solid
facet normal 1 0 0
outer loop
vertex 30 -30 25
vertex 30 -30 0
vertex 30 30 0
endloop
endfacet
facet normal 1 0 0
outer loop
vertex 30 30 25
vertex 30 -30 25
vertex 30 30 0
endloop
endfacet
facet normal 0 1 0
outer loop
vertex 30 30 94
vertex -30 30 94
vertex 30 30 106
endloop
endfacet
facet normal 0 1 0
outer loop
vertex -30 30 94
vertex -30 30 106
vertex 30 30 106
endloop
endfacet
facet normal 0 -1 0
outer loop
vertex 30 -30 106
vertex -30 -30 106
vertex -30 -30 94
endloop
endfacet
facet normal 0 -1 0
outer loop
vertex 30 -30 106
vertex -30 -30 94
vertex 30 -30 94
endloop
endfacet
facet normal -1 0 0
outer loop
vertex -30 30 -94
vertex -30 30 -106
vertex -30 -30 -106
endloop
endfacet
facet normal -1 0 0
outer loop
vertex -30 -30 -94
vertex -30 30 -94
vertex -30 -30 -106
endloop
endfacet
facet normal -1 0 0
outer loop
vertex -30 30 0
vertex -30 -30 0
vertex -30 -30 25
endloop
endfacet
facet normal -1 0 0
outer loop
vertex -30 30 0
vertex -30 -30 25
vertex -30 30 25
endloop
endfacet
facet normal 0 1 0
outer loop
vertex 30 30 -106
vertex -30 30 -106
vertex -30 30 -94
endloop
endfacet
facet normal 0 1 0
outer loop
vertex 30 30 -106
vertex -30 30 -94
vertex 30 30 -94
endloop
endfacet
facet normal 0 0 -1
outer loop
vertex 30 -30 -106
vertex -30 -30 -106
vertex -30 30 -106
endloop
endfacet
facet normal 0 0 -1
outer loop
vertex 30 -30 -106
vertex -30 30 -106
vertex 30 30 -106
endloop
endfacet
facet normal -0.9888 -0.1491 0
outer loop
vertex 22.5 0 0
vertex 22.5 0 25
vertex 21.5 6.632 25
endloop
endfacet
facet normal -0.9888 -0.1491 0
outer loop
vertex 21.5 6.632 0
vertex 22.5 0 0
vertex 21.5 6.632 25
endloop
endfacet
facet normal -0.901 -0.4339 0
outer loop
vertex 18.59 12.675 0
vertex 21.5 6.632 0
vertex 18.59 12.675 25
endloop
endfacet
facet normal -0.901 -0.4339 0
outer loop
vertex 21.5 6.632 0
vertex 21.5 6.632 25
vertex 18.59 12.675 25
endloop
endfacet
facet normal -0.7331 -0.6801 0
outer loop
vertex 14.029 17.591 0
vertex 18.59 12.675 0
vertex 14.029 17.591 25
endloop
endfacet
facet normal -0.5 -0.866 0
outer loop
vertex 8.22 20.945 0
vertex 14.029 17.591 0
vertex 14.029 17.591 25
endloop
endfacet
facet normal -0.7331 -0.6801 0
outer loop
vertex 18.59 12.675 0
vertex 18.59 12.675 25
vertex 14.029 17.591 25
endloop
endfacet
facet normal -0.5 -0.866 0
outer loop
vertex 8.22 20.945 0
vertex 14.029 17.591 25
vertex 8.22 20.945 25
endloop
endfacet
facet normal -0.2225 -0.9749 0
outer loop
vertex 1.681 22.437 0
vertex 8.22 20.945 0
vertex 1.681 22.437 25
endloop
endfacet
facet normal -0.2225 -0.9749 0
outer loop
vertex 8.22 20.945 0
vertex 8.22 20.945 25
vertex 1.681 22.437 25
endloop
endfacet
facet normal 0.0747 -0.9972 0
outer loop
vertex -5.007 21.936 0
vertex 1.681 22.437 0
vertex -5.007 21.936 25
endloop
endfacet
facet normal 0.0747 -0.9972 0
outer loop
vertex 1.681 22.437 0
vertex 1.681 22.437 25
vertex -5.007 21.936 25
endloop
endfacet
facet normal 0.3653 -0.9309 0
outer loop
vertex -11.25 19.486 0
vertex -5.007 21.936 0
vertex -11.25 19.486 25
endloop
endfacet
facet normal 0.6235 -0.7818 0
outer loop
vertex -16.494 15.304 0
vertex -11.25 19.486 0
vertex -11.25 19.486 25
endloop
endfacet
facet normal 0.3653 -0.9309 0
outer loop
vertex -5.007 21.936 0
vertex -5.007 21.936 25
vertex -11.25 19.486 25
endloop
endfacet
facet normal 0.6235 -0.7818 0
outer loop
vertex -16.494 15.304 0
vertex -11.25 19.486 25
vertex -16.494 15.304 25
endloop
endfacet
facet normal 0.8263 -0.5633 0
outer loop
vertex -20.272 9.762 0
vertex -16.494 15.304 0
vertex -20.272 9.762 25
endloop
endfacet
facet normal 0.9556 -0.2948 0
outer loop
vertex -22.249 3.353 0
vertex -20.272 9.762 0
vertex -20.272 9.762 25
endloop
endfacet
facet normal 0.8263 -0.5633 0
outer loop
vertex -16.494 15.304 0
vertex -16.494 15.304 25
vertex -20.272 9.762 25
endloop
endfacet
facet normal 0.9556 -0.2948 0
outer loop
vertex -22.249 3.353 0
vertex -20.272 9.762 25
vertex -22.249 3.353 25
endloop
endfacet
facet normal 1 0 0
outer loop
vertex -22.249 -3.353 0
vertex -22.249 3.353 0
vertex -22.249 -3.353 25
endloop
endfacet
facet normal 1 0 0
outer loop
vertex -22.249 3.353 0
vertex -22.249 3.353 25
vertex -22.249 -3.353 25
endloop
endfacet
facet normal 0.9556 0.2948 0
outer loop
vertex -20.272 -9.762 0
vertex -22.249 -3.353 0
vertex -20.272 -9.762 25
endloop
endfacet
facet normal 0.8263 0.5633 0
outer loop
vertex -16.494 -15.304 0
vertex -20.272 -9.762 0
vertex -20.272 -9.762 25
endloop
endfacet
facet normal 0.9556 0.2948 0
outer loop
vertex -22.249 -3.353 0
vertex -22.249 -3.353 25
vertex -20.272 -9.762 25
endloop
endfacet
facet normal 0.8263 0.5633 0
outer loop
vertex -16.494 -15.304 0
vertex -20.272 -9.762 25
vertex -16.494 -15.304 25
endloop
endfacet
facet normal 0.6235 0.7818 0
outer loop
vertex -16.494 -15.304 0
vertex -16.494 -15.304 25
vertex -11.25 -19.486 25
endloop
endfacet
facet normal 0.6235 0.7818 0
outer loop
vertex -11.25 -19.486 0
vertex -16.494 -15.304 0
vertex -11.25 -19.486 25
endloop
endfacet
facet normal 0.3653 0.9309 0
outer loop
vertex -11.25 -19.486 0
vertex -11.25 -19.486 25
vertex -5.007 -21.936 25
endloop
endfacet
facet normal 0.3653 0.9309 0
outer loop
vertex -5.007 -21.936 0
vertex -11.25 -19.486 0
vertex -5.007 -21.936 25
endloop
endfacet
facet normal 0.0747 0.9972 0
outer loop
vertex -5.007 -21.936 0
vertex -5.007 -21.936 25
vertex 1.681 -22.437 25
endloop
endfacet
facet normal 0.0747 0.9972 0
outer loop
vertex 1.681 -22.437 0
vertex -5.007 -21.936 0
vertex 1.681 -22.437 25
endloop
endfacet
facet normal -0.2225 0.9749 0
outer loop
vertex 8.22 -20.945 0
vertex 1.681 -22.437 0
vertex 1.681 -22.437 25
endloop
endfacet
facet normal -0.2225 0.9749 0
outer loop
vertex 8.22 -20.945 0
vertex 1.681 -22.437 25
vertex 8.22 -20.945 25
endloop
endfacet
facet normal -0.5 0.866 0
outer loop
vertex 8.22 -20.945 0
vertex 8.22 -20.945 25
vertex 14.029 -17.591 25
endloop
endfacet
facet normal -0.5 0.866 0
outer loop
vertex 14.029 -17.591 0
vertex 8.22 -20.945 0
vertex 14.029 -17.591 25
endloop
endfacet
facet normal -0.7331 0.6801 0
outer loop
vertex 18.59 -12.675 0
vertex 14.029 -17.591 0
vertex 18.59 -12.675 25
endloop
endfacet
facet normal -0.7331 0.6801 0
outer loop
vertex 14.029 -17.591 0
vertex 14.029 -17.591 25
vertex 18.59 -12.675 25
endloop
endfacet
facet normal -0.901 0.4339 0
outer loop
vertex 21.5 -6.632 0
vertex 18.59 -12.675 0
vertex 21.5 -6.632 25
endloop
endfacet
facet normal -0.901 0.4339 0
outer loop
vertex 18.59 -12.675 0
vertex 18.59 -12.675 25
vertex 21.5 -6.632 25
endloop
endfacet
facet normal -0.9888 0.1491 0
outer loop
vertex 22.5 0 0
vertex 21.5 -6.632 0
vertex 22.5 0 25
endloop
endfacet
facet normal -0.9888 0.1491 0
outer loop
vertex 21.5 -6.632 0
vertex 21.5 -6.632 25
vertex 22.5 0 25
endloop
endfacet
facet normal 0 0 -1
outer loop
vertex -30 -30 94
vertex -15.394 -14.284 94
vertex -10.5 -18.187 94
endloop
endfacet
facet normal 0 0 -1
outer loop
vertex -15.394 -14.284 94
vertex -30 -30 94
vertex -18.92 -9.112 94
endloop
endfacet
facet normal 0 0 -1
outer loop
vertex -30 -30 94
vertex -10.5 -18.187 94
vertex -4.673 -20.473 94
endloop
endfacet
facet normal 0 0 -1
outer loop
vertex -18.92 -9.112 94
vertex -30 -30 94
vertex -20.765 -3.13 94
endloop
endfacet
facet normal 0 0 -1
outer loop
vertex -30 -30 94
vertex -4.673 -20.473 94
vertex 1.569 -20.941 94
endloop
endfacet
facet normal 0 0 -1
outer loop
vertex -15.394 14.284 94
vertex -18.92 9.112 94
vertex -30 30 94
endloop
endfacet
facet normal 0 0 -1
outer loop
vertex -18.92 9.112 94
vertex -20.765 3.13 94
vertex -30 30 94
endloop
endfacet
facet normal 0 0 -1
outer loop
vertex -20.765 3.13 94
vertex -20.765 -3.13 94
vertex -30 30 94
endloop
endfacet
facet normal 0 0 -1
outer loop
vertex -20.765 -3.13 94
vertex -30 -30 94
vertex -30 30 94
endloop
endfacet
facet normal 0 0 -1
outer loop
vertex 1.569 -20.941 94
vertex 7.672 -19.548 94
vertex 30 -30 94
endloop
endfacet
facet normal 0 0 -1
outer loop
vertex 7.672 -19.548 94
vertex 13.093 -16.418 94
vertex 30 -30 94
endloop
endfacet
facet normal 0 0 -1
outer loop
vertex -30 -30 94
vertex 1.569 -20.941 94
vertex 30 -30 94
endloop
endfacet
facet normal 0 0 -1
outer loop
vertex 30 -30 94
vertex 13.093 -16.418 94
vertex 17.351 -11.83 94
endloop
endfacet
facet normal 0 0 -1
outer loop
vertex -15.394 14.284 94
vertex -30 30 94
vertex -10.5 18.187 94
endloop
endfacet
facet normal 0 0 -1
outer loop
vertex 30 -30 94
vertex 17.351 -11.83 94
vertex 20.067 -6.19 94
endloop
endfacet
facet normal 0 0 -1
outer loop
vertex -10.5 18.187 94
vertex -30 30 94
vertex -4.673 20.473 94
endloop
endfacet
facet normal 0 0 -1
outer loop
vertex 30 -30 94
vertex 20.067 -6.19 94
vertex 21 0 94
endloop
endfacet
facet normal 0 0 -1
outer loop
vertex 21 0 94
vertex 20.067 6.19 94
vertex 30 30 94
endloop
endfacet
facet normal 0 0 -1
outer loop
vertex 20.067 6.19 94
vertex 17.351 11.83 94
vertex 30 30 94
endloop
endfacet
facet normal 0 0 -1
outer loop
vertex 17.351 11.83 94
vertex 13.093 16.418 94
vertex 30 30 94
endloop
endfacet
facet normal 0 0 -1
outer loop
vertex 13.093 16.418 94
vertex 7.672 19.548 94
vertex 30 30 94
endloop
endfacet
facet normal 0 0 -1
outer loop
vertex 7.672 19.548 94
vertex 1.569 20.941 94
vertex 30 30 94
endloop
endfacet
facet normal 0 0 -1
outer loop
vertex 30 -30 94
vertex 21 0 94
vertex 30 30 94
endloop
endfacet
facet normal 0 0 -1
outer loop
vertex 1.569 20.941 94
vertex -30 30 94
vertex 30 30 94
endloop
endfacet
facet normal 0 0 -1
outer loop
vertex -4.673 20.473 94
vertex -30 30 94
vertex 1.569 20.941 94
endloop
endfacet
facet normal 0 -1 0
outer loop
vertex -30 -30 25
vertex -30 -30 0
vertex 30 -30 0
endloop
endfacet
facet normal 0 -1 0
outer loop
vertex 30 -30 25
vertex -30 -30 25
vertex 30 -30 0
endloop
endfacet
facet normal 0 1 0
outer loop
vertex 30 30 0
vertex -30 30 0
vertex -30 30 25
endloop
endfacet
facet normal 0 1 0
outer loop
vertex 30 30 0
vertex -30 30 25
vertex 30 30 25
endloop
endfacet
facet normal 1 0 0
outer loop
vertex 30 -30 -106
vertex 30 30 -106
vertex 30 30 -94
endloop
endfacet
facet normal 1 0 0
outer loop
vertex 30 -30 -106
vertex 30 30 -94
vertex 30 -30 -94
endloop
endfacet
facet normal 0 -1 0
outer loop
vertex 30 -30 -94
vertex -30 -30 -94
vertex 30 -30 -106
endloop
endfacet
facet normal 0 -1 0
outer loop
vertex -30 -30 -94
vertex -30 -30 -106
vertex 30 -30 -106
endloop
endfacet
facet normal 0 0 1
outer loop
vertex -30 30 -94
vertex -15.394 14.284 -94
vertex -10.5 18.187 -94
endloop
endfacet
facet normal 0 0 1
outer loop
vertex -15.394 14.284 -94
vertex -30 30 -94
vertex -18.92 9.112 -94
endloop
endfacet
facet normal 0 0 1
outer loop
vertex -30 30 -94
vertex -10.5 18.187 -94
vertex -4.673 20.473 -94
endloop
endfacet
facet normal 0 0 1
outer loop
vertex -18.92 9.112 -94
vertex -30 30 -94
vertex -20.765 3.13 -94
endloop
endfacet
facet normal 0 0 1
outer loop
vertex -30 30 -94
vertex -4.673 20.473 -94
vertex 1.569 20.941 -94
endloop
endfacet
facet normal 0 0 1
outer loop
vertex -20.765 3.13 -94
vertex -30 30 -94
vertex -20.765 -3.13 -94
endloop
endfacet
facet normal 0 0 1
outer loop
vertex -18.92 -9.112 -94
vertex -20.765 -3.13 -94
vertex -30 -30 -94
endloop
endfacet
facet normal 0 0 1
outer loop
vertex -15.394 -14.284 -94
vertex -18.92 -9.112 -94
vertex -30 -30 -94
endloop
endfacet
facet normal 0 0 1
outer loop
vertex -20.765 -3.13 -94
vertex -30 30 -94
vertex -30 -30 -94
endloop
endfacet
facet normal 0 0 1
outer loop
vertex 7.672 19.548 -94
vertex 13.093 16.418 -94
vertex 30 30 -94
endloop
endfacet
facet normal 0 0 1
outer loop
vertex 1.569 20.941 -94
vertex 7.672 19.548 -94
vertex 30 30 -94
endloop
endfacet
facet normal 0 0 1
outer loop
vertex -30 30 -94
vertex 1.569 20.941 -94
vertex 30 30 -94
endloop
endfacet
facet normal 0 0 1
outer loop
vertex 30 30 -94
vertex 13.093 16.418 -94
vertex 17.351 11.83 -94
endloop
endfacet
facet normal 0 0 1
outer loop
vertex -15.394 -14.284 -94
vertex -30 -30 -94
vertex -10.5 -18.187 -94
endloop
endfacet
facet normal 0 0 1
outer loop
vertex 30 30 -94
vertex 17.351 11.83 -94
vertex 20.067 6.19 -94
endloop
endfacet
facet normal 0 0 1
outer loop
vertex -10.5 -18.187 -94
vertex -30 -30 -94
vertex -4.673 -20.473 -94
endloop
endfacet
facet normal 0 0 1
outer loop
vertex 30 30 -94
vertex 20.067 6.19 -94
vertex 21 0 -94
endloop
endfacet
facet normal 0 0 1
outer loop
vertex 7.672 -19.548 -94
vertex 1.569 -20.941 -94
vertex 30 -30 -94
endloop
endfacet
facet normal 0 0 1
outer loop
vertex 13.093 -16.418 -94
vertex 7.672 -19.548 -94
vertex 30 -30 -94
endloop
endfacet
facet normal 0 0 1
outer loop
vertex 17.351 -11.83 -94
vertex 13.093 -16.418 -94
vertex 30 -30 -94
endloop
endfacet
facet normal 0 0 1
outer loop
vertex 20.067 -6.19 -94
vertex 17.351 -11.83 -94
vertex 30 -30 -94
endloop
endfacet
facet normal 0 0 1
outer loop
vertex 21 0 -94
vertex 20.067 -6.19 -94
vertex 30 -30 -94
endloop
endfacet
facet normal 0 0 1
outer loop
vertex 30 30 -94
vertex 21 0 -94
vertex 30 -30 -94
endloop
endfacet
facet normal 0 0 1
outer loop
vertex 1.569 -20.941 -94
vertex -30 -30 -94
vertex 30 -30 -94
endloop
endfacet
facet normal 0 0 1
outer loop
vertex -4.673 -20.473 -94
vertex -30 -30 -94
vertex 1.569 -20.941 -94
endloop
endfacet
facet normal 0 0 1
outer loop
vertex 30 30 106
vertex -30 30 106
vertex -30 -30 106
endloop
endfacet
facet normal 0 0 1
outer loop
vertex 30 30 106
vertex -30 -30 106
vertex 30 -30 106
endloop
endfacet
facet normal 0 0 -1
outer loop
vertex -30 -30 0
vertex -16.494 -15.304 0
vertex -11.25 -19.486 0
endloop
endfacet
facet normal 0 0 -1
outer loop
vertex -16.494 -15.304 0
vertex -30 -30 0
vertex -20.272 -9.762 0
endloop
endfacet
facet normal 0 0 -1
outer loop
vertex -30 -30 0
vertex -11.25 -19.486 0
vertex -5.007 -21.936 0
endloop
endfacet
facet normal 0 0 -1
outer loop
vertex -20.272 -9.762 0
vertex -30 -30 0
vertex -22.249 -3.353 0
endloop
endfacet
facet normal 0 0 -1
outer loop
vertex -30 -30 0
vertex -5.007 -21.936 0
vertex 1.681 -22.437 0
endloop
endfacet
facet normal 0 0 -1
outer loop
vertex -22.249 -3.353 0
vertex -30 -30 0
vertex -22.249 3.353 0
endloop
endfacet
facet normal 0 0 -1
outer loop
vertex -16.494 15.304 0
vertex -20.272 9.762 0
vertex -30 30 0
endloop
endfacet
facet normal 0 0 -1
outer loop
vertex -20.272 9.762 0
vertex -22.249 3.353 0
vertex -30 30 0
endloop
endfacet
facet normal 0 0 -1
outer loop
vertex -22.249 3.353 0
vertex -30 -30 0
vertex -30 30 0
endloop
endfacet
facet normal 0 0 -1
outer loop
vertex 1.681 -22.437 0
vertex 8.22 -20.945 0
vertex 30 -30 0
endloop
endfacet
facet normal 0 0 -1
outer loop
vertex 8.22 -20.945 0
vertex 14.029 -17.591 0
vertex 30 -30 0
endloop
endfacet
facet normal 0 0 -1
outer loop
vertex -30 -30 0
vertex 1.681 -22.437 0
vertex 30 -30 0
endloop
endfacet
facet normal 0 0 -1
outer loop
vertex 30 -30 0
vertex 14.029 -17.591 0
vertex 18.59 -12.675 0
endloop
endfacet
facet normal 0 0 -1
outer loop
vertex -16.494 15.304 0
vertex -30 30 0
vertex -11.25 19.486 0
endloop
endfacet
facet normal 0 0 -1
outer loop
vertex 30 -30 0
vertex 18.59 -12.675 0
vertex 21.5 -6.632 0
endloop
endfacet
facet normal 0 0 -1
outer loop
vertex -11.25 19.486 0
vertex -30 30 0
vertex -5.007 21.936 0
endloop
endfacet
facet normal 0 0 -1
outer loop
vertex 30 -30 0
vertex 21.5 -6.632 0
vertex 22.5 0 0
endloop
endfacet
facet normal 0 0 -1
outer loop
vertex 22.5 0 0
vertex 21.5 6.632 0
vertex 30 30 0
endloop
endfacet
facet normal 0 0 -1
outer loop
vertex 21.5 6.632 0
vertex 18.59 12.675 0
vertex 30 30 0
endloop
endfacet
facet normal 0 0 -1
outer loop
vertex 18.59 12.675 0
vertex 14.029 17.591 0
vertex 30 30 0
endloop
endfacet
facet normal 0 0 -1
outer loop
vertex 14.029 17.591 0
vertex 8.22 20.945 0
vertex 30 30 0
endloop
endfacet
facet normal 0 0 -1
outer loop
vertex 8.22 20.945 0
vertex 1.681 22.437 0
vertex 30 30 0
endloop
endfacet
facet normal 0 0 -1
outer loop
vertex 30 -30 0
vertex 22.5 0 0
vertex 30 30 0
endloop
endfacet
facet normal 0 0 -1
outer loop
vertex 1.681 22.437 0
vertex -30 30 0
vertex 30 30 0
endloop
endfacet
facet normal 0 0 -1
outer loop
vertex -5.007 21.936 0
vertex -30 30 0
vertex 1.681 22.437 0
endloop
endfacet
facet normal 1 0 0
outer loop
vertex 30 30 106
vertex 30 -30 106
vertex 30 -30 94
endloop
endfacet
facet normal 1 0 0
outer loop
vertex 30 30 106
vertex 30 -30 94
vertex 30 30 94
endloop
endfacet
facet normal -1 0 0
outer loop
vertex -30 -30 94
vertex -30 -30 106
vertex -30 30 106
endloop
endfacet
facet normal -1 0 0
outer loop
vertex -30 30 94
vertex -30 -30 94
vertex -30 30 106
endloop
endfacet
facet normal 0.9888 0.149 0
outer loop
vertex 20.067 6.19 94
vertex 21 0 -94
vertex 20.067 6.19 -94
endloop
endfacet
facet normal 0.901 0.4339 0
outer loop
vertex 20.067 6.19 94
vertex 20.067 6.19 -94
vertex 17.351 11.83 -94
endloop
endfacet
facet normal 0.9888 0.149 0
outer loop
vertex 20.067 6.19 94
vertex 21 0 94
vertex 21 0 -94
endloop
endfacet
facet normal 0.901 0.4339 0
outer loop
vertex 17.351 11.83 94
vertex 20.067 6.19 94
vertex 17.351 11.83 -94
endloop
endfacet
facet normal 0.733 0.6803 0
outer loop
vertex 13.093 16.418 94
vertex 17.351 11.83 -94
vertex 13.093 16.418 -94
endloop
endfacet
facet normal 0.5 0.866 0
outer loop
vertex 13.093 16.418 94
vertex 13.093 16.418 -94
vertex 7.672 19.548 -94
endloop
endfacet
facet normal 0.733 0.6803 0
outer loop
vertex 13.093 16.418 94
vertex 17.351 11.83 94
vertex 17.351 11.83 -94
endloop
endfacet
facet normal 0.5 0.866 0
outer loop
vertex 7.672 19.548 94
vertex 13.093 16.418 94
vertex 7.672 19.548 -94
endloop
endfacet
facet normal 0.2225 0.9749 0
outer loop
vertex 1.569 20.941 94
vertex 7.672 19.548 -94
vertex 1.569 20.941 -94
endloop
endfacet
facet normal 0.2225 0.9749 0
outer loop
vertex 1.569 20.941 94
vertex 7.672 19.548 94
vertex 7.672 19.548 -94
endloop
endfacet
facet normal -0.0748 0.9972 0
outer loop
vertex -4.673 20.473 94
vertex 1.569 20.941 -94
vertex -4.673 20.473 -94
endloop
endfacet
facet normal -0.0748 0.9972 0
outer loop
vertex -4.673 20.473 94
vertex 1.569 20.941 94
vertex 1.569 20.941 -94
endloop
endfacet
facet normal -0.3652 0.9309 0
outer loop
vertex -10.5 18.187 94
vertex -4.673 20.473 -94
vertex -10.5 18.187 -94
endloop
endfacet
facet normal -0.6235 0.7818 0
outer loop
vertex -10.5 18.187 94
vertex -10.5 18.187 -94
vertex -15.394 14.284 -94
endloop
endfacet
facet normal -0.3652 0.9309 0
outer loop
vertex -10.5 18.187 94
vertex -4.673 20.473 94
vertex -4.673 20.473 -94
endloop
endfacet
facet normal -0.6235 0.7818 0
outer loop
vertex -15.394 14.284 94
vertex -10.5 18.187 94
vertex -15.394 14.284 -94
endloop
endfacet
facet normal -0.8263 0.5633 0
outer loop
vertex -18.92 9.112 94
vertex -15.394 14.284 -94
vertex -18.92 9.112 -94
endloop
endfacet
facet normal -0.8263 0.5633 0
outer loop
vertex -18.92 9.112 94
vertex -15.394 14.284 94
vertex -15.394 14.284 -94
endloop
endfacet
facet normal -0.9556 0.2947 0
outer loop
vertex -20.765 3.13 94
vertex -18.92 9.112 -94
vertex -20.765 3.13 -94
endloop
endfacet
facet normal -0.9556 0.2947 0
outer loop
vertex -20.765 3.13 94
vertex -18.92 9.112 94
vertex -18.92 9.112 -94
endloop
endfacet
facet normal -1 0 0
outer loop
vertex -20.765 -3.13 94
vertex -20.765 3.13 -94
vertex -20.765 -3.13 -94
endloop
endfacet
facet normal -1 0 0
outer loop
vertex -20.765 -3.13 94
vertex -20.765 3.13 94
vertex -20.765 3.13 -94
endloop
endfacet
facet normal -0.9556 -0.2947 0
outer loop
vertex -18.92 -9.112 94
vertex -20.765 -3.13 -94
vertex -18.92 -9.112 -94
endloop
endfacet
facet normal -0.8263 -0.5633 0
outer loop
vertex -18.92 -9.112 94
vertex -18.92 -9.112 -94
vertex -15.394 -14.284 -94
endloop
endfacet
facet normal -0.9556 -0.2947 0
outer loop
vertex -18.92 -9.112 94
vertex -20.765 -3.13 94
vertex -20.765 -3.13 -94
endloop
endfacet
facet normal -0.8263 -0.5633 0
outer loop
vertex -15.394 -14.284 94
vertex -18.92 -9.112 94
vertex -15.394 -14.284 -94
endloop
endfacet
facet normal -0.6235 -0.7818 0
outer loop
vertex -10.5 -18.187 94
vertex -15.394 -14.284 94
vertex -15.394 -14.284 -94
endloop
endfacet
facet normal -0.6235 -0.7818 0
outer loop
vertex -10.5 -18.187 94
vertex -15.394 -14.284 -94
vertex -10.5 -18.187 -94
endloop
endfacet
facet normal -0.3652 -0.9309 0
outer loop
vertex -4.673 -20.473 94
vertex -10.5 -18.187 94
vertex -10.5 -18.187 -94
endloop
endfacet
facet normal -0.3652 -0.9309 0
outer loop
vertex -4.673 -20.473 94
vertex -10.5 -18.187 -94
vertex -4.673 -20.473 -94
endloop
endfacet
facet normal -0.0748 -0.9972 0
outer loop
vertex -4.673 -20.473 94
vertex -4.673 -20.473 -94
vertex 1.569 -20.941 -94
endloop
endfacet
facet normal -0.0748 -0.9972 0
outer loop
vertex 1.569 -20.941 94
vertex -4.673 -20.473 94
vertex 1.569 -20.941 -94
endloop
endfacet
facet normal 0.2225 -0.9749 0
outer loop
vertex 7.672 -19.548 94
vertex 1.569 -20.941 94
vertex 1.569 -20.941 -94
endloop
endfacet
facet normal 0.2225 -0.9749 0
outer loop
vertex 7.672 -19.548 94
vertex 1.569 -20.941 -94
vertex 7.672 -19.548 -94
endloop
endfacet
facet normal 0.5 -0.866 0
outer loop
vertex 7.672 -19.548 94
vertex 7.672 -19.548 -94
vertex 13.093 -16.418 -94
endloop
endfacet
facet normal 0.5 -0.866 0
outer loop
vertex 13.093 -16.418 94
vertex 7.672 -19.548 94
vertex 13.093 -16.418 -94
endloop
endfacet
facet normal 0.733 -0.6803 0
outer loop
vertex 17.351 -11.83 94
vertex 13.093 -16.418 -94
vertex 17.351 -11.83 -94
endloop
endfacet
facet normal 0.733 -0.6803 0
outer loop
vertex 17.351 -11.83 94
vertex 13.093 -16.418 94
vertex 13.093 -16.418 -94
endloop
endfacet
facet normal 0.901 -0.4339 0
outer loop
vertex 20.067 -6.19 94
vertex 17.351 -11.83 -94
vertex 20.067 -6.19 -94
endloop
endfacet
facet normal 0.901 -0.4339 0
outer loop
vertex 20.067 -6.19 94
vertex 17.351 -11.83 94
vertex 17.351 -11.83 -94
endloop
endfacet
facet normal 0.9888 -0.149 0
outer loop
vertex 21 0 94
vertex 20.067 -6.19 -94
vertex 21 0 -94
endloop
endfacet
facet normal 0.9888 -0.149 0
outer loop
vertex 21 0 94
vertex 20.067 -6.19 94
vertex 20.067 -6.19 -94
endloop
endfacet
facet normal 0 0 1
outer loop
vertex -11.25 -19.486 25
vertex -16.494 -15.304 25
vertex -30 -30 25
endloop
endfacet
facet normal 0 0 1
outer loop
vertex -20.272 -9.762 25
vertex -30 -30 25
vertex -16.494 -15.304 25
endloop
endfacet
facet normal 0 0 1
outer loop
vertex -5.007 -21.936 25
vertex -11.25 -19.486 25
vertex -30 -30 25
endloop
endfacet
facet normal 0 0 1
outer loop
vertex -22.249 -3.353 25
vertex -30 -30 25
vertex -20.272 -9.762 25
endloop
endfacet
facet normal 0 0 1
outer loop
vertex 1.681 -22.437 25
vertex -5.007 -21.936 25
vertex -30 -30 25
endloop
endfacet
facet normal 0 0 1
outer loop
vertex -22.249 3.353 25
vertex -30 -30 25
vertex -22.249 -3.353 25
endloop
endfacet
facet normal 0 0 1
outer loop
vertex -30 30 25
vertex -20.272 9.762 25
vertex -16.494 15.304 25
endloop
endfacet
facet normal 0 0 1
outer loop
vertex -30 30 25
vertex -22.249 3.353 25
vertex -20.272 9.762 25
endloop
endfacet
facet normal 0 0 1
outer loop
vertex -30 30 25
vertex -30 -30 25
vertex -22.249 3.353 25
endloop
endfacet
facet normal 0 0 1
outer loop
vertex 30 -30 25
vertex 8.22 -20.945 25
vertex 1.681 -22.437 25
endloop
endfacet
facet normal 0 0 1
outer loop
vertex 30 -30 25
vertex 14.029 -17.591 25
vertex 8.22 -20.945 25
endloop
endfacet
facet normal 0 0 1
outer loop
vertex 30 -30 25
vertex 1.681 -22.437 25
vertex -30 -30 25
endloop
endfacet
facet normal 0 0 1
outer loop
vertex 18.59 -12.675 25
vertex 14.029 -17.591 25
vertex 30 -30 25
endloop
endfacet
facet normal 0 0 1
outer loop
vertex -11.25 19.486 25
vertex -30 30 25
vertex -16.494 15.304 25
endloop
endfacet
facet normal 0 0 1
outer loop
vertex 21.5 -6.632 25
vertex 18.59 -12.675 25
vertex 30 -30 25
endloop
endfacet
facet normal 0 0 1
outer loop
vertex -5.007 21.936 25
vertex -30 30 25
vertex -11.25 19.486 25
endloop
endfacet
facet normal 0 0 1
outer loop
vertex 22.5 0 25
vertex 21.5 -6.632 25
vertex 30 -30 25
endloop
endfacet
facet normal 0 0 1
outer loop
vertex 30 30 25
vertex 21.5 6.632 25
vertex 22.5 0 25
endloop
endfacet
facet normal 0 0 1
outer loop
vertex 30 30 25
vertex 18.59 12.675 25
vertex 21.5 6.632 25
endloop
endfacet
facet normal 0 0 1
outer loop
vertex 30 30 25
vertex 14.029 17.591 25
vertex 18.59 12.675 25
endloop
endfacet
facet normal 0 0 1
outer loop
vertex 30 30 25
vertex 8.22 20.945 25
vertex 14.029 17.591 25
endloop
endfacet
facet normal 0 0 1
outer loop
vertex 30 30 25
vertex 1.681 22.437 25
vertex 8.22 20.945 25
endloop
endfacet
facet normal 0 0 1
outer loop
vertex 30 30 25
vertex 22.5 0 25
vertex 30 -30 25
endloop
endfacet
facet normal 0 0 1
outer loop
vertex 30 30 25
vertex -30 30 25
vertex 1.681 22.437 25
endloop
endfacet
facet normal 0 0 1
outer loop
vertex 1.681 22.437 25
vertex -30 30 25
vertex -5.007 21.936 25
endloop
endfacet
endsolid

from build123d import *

# Parameters (mm, degrees)
F0_W     = 60
F0_H     = 60
F1_DEPTH = 25
F2_R     = 22.5
F3_DEPTH = 25
F4_R     = 21
F5_DEPTH = 100
F6_W     = 60
F6_H     = 60
F6_R     = 21
F7_DEPTH = 6
F8_W     = 60
F8_H     = 60
F8_R     = 21
F9_DEPTH = 6


with BuildPart() as f1:
    # F0 (on Top) → F1 (new body)
    with BuildSketch(Plane.XY):
        Rectangle(F0_W, F0_H)
    extrude(amount=F1_DEPTH)

    # F2 (on face) → F3 (cut)
    with BuildSketch(Plane.XY.offset(25)):
        Circle(F2_R)
    extrude(amount=-F3_DEPTH, mode=Mode.SUBTRACT)


with BuildPart() as f5:
    # F4 (on Top) → F5 (new body, symmetric)
    with BuildSketch(Plane.XY):
        Circle(F4_R)
    extrude(amount=F5_DEPTH, both=True)

    # F6 (on face) → F7 (join, symmetric)
    with BuildSketch(Plane.XY.offset(100)):
        Rectangle(F6_W, F6_H)
        Circle(F6_R, mode=Mode.SUBTRACT)
        Circle(F6_R)
    extrude(amount=F7_DEPTH, both=True)

    # F8 (on face) → F9 (join, symmetric)
    with BuildSketch(Plane(origin=(0, 0, -100), x_dir=(1, 0, 0), z_dir=(0, 0, -1))):
        Rectangle(F8_W, F8_H)
        Circle(F8_R, mode=Mode.SUBTRACT)
        Circle(F8_R)
    extrude(amount=F9_DEPTH, both=True)


solid = Compound([f1.part, f5.part])
